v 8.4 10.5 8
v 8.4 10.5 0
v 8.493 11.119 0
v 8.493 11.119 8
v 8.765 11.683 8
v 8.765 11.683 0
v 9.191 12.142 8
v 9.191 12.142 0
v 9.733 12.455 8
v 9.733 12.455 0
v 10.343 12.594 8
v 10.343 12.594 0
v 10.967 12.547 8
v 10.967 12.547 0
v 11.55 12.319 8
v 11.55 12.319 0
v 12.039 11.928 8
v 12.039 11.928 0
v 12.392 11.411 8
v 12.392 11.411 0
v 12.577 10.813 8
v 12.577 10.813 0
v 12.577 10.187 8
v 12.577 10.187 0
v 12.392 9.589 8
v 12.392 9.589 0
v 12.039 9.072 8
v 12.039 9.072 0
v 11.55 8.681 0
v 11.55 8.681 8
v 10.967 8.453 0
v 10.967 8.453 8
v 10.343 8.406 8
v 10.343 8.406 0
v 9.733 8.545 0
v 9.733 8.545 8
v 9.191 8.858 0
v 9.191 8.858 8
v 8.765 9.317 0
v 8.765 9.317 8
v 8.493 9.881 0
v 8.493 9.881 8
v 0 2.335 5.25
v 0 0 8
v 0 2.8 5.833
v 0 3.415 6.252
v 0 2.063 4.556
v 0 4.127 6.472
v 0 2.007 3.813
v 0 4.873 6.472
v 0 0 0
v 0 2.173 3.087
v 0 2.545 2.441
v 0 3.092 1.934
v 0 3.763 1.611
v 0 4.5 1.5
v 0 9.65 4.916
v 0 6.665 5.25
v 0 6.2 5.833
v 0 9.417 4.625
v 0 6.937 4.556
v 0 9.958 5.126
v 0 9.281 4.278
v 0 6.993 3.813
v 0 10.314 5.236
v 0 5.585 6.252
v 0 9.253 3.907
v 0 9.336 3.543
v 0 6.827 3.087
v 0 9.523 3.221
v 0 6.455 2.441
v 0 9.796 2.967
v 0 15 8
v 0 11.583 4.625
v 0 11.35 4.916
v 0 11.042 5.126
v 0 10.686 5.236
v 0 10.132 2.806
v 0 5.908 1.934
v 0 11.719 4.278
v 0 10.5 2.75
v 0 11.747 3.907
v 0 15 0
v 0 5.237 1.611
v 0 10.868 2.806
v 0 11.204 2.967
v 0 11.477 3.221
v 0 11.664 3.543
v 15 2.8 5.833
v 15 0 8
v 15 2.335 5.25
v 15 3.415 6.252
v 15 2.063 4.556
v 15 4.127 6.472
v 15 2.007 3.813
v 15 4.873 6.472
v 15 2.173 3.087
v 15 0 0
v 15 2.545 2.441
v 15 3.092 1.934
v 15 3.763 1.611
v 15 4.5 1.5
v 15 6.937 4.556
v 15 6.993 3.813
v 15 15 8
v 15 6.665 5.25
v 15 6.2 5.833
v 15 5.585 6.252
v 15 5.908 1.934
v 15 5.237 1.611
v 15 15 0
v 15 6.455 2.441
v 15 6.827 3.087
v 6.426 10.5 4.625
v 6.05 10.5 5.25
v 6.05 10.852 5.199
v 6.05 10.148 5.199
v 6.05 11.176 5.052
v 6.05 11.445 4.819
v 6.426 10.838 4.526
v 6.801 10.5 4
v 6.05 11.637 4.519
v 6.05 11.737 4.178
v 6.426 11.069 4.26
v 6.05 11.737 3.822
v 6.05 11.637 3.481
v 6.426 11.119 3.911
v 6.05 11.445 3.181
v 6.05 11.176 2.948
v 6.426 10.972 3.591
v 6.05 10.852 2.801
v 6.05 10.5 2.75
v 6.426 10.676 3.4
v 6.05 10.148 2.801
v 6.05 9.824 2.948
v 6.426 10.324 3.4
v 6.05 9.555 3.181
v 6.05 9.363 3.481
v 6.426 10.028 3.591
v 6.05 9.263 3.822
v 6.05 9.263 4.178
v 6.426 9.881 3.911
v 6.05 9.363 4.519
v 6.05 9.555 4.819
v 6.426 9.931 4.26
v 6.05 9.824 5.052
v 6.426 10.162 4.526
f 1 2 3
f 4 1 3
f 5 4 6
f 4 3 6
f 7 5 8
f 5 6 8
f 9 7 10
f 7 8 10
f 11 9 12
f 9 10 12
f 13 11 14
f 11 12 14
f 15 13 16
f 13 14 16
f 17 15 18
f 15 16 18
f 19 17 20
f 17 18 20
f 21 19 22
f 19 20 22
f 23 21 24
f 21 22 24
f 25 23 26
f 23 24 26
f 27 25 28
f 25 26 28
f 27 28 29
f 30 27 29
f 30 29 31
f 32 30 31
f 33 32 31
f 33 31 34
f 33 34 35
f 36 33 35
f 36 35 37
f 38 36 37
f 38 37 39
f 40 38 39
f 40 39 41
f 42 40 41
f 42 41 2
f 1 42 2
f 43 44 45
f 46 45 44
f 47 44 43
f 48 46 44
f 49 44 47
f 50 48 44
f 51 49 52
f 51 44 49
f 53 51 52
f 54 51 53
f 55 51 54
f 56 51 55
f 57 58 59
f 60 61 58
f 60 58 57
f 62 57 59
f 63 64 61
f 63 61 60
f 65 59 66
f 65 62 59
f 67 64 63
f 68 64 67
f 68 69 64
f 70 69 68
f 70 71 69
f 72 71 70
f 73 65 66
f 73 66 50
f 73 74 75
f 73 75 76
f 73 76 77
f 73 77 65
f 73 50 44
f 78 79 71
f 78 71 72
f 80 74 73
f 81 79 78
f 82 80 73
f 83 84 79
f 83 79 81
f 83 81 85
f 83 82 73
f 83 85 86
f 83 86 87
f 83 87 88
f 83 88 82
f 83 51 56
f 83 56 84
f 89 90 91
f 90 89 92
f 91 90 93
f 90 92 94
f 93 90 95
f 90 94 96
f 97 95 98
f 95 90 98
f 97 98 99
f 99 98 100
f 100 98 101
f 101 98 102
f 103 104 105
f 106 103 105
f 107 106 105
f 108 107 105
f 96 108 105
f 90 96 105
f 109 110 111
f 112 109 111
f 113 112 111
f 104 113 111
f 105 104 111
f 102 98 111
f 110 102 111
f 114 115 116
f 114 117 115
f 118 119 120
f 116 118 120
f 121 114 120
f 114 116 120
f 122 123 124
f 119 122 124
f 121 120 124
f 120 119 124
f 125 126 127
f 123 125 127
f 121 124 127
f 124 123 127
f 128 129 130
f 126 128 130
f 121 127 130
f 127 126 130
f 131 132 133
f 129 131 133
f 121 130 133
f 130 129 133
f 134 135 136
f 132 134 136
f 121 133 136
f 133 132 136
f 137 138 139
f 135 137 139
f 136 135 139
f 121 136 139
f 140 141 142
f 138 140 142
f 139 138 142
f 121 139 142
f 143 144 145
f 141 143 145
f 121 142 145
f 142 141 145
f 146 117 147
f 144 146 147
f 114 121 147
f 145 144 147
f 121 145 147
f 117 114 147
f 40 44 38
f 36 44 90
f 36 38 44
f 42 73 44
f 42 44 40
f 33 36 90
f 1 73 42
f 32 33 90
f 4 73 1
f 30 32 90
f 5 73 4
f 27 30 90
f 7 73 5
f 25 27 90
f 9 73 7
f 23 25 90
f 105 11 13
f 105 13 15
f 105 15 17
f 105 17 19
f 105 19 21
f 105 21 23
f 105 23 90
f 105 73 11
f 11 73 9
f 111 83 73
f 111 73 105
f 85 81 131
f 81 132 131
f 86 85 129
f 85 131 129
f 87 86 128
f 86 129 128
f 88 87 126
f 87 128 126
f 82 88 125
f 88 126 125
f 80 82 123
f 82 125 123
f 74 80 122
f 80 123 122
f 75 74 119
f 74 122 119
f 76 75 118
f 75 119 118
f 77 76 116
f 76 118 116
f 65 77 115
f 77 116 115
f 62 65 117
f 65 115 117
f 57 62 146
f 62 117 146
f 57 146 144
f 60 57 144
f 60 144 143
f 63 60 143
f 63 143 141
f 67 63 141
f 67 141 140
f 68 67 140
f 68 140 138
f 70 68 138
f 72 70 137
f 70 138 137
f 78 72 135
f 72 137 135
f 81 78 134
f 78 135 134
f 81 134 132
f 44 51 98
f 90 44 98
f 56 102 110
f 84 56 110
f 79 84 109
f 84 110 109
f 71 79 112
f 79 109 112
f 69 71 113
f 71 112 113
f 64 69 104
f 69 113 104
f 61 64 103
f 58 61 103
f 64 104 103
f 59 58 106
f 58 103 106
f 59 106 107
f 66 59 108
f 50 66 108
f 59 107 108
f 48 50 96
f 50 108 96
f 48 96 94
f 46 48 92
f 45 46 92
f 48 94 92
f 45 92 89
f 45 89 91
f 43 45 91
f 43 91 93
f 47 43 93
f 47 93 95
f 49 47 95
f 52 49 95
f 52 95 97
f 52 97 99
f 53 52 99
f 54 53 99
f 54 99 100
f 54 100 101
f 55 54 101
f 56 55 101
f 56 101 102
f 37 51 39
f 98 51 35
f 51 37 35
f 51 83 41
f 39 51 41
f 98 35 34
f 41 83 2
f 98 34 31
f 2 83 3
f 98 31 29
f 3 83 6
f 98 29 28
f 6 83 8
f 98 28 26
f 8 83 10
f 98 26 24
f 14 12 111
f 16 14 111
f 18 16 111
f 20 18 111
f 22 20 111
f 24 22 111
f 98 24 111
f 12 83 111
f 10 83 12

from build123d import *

# Parameters (mm, degrees)
SKETCH1_W                      = 15
SKETCH1_H                      = 15
BOSS_EXTRUDE1_DEPTH            = 8
TAP_DRILL_FOR_M5X0_8_TAP1_D    = 4.2
F_5_0_5_DIAMETER_HOLE1_D       = 5
F_2_5_2_5_DIAMETER_HOLE1_D     = 2.5
F_2_5_2_5_DIAMETER_HOLE1_DEPTH = 6.05
F_2_5_2_5_DIAMETER_HOLE1_TIP   = 0.751075774


with BuildPart() as part:
    # Sketch1 → Boss-Extrude1 (new body)
    with BuildSketch(Plane.XY):
        with Locations((7.5, 7.5)):
            Rectangle(SKETCH1_W, SKETCH1_H)
    extrude(amount=BOSS_EXTRUDE1_DEPTH)

    # Tap Drill for M5x0.8 Tap1 (through all)
    with Locations(Plane.XY.offset(8)):
        with Locations((10.5, 10.5)):
            Hole(TAP_DRILL_FOR_M5X0_8_TAP1_D / 2)

    # Ø5.0 (5) Diameter Hole1 (through all)
    with Locations(Plane.ZY):
        with Locations((4, 4.5)):
            Hole(F_5_0_5_DIAMETER_HOLE1_D / 2)

    # Ø2.5 (2.5) Diameter Hole1
    with Locations(Plane.ZY):
        with Locations((4, 10.5)):
            Hole(F_2_5_2_5_DIAMETER_HOLE1_D / 2, depth=F_2_5_2_5_DIAMETER_HOLE1_DEPTH)
            with Locations((0, 0, -(F_2_5_2_5_DIAMETER_HOLE1_DEPTH + F_2_5_2_5_DIAMETER_HOLE1_TIP / 2))):  # 118° drill point
                Cone(0, F_2_5_2_5_DIAMETER_HOLE1_D / 2, F_2_5_2_5_DIAMETER_HOLE1_TIP, mode=Mode.SUBTRACT)


solid = part.part
